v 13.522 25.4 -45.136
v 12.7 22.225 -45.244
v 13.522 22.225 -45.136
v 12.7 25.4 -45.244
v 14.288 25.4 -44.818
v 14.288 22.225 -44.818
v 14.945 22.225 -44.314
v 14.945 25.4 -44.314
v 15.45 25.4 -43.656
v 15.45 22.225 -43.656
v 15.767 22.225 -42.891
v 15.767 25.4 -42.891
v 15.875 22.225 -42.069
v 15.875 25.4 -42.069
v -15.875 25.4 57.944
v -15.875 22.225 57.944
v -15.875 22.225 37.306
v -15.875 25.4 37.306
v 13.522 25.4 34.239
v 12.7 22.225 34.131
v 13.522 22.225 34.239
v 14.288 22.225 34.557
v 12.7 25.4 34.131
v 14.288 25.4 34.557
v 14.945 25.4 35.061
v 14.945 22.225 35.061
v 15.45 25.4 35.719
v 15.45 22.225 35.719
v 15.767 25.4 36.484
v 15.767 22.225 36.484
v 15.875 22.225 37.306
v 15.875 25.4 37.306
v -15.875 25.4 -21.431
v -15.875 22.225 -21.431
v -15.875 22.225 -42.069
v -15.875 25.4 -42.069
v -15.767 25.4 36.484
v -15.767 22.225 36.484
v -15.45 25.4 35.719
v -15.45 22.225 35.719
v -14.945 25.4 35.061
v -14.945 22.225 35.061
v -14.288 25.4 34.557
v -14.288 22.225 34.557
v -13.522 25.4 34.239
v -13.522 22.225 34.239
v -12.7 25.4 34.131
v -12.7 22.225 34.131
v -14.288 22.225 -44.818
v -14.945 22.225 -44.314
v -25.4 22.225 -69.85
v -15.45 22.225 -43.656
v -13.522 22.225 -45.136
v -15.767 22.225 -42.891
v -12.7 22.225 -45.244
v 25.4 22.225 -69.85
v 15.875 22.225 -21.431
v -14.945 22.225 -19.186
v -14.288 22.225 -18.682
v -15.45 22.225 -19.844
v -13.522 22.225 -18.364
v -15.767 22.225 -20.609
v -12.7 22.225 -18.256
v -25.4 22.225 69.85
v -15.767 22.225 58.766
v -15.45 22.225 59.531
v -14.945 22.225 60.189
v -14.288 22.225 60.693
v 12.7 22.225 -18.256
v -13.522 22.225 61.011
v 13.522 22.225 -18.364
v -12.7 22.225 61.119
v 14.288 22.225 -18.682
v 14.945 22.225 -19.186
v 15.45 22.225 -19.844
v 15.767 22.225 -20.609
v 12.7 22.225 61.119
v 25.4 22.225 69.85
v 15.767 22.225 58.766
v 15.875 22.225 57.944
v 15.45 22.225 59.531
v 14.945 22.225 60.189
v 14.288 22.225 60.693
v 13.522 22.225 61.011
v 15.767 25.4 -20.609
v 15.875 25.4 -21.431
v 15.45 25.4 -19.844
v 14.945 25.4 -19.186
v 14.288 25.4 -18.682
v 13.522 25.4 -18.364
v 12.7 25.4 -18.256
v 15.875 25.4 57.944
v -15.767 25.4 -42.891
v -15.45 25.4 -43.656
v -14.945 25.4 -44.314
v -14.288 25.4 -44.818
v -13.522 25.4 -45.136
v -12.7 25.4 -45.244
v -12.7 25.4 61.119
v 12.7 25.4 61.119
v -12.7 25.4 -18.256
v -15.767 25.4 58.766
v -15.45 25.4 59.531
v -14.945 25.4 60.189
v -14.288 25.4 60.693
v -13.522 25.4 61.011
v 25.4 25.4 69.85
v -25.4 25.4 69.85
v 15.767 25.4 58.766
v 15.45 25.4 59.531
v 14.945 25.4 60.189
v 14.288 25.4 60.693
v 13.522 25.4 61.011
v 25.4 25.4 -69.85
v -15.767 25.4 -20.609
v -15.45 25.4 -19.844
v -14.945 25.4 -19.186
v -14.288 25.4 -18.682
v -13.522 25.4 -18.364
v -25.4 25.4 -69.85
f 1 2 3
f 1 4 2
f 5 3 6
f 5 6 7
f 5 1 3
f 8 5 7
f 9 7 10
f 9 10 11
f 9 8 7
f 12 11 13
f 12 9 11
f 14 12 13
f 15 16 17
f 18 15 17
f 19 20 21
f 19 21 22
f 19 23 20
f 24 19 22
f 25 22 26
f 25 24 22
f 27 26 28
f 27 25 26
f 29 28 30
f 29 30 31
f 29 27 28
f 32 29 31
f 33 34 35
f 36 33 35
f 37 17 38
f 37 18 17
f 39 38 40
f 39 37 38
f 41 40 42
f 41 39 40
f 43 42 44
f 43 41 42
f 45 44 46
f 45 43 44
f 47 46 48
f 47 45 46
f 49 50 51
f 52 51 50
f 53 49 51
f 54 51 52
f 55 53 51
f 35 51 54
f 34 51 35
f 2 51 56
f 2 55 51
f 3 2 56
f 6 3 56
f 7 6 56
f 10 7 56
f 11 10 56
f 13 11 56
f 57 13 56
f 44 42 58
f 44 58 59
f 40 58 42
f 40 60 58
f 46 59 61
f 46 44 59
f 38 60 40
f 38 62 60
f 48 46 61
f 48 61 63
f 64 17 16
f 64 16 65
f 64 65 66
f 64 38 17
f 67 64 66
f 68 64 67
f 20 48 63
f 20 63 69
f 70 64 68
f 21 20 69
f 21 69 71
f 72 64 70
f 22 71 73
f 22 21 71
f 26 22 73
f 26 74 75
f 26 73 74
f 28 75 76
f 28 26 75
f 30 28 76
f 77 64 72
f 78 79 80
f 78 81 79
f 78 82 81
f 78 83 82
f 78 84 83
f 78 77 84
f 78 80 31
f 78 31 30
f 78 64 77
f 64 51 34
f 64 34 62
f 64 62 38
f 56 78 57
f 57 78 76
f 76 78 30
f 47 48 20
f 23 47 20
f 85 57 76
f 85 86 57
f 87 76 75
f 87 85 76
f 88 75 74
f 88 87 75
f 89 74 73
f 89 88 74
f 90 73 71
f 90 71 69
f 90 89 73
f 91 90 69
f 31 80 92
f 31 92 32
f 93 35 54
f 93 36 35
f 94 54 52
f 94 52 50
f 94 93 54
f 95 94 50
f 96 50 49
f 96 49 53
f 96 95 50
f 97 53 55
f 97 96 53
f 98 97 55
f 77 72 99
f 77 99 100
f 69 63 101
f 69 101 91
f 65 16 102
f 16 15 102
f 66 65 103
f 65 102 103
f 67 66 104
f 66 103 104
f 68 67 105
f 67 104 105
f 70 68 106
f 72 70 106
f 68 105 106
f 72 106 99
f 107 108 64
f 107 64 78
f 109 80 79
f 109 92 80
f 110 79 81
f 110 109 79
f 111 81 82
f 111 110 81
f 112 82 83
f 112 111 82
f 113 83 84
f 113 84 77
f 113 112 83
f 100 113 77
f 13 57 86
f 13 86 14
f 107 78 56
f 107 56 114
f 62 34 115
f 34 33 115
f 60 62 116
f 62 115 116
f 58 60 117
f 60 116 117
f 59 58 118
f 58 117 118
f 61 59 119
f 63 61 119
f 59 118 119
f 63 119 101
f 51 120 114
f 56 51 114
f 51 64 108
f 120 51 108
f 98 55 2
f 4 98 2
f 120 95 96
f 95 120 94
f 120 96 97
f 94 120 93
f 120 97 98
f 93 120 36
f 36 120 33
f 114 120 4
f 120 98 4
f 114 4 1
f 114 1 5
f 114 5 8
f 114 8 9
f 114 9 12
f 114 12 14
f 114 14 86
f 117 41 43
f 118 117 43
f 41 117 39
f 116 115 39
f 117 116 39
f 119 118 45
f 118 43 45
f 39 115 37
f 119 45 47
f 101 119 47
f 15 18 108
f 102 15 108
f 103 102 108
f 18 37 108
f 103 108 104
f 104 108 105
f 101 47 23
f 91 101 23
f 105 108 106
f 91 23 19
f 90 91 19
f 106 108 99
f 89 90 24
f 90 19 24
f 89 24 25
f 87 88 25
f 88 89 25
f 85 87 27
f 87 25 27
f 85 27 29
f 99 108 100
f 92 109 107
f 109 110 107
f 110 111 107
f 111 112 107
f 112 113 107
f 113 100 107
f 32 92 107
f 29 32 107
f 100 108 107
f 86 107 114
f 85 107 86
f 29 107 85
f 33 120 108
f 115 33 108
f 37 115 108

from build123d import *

# Parameters (mm, degrees)
SKETCH1_W               = 50.8
SKETCH1_H               = 50.8
BOSS_EXTRUDE1_DEPTH     = 69.85
SHELL1_T                = -3.175
SKETCH2_W               = 31.75
SKETCH2_H               = 26.9875
CUT_EXTRUDE1_DEPTH      = 79.545162168
FILLET1_R               = 3.175
CUT_EXTRUDE2_DEPTH      = 79.545162168
CUT_EXTRUDE2_DEPTH_BACK = 79.545162168
SKETCH3_R               = 3.175
CUT_EXTRUDE3_DEPTH      = 79.545162168
CUT_EXTRUDE3_DEPTH_BACK = 79.545162168
SKETCH4_R               = 2.4892
CUT_EXTRUDE4_DEPTH      = 79.545162168
CUT_EXTRUDE4_DEPTH_BACK = 79.545162168
SKETCH5_R               = 2.4892
FILLET2_R               = 3.175
SKETCH6_W               = 139.7
SKETCH6_H               = 47.625
CUT_EXTRUDE5_DEPTH      = 91.02678768


with BuildPart() as part:
    # Sketch1 → Boss-Extrude1 (new, symmetric)
    with BuildSketch(Plane.XY):
        Rectangle(SKETCH1_W, SKETCH1_H)
    extrude(amount=BOSS_EXTRUDE1_DEPTH, both=True)

    # Shell1
    shell1_openings = [part.faces().sort_by_distance(p)[0] for p in [
        (0, 0, 69.85),
        (0, 0, -69.85),
    ]]
    offset(amount=SHELL1_T, openings=shell1_openings, kind=Kind.INTERSECTION)

    # Sketch2 → Cut-Extrude1 (cut, through all)
    with BuildSketch(Plane(origin=(0, 0, 0), x_dir=(1, 0, 0), z_dir=(0, 1, 0))):
        with Locations((0, 31.75)):
            Rectangle(SKETCH2_W, SKETCH2_H)
        with Locations((0, -47.625)):
            Rectangle(SKETCH2_W, SKETCH2_H)
    extrude(amount=CUT_EXTRUDE1_DEPTH, mode=Mode.SUBTRACT)

    # Fillet1
    fillet1_edges = [part.edges().sort_by_distance(p)[0] for p in [
        (15.875, 23.8125, -18.25625),
        (15.875, 23.8125, -45.24375),
        (-15.875, 23.8125, -45.24375),
        (-15.875, 23.8125, -18.25625),
    ]]
    fillet(fillet1_edges, radius=FILLET1_R)

    # Sketch3 → Cut-Extrude2 (cut, two sides: drawn at the far end of the back side and taken through both)
    with BuildSketch(Plane(origin=(0, 0, 0), x_dir=(0, 0, -1), z_dir=(1, 0, 0)).offset(-CUT_EXTRUDE2_DEPTH_BACK)):
        with Locations((31.75, 9.525)):
            Circle(SKETCH3_R)
        with Locations((-44.45, 9.525)):
            Circle(SKETCH3_R)
    extrude(amount=CUT_EXTRUDE2_DEPTH + CUT_EXTRUDE2_DEPTH_BACK, mode=Mode.SUBTRACT)

    # Sketch4 → Cut-Extrude3 (cut, two sides: drawn at the far end of the back side and taken through both)
    with BuildSketch(Plane(origin=(0, 0, 0), x_dir=(0, 0, -1), z_dir=(1, 0, 0)).offset(-CUT_EXTRUDE3_DEPTH_BACK)):
        with Locations((57.15, 12.7)):
            Circle(SKETCH4_R)
        with Locations((44.45, -12.7)):
            Circle(SKETCH4_R)
        with Locations((31.75, -12.7)):
            Circle(SKETCH4_R)
        with Locations((19.05, -12.7)):
            Circle(SKETCH4_R)
        with Locations((57.15, 0)):
            Circle(SKETCH4_R)
        with Locations((57.15, -12.7)):
            Circle(SKETCH4_R)
        with Locations((-61.9125, 12.7)):
            Circle(SKETCH4_R)
        with Locations((-11.1125, 12.7)):
            Circle(SKETCH4_R)
        with Locations((-36.5125, -12.7)):
            Circle(SKETCH4_R)
        with Locations((-11.1125, -12.7)):
            Circle(SKETCH4_R)
        with Locations((-61.9125, -12.7)):
            Circle(SKETCH4_R)
    extrude(amount=CUT_EXTRUDE3_DEPTH + CUT_EXTRUDE3_DEPTH_BACK, mode=Mode.SUBTRACT)

    # Sketch5 → Cut-Extrude4 (cut, two sides: drawn at the far end of the back side and taken through both)
    with BuildSketch(Plane(origin=(0, 0, 0), x_dir=(1, 0, 0), z_dir=(0, 1, 0)).offset(-CUT_EXTRUDE4_DEPTH_BACK)):
        with Locations(Location((-12.7, -57.15, 0), (0, 0, 270))):
            Circle(SKETCH5_R)
        with Locations(Location((0, -57.15, 0), (0, 0, 270))):
            Circle(SKETCH5_R)
        with Locations(Location((12.7, -57.15, 0), (0, 0, 270))):
            Circle(SKETCH5_R)
    extrude(amount=CUT_EXTRUDE4_DEPTH + CUT_EXTRUDE4_DEPTH_BACK, mode=Mode.SUBTRACT)

    # Fillet2
    fillet2_edges = [part.edges().sort_by_distance(p)[0] for p in [
        (15.875, 23.8125, 61.11875),
        (15.875, 23.8125, 34.13125),
        (-15.875, 23.8125, 34.13125),
        (-15.875, 23.8125, 61.11875),
    ]]
    fillet(fillet2_edges, radius=FILLET2_R)

    # Sketch6 → Cut-Extrude5 (cut, through all)
    with BuildSketch(Plane(origin=(25.4, 0, 0), x_dir=(0, 0, -1), z_dir=(1, 0, 0))):
        with Locations((0, -1.5875)):
            Rectangle(SKETCH6_W, SKETCH6_H)
    extrude(amount=-CUT_EXTRUDE5_DEPTH, mode=Mode.SUBTRACT)


solid = part.part
